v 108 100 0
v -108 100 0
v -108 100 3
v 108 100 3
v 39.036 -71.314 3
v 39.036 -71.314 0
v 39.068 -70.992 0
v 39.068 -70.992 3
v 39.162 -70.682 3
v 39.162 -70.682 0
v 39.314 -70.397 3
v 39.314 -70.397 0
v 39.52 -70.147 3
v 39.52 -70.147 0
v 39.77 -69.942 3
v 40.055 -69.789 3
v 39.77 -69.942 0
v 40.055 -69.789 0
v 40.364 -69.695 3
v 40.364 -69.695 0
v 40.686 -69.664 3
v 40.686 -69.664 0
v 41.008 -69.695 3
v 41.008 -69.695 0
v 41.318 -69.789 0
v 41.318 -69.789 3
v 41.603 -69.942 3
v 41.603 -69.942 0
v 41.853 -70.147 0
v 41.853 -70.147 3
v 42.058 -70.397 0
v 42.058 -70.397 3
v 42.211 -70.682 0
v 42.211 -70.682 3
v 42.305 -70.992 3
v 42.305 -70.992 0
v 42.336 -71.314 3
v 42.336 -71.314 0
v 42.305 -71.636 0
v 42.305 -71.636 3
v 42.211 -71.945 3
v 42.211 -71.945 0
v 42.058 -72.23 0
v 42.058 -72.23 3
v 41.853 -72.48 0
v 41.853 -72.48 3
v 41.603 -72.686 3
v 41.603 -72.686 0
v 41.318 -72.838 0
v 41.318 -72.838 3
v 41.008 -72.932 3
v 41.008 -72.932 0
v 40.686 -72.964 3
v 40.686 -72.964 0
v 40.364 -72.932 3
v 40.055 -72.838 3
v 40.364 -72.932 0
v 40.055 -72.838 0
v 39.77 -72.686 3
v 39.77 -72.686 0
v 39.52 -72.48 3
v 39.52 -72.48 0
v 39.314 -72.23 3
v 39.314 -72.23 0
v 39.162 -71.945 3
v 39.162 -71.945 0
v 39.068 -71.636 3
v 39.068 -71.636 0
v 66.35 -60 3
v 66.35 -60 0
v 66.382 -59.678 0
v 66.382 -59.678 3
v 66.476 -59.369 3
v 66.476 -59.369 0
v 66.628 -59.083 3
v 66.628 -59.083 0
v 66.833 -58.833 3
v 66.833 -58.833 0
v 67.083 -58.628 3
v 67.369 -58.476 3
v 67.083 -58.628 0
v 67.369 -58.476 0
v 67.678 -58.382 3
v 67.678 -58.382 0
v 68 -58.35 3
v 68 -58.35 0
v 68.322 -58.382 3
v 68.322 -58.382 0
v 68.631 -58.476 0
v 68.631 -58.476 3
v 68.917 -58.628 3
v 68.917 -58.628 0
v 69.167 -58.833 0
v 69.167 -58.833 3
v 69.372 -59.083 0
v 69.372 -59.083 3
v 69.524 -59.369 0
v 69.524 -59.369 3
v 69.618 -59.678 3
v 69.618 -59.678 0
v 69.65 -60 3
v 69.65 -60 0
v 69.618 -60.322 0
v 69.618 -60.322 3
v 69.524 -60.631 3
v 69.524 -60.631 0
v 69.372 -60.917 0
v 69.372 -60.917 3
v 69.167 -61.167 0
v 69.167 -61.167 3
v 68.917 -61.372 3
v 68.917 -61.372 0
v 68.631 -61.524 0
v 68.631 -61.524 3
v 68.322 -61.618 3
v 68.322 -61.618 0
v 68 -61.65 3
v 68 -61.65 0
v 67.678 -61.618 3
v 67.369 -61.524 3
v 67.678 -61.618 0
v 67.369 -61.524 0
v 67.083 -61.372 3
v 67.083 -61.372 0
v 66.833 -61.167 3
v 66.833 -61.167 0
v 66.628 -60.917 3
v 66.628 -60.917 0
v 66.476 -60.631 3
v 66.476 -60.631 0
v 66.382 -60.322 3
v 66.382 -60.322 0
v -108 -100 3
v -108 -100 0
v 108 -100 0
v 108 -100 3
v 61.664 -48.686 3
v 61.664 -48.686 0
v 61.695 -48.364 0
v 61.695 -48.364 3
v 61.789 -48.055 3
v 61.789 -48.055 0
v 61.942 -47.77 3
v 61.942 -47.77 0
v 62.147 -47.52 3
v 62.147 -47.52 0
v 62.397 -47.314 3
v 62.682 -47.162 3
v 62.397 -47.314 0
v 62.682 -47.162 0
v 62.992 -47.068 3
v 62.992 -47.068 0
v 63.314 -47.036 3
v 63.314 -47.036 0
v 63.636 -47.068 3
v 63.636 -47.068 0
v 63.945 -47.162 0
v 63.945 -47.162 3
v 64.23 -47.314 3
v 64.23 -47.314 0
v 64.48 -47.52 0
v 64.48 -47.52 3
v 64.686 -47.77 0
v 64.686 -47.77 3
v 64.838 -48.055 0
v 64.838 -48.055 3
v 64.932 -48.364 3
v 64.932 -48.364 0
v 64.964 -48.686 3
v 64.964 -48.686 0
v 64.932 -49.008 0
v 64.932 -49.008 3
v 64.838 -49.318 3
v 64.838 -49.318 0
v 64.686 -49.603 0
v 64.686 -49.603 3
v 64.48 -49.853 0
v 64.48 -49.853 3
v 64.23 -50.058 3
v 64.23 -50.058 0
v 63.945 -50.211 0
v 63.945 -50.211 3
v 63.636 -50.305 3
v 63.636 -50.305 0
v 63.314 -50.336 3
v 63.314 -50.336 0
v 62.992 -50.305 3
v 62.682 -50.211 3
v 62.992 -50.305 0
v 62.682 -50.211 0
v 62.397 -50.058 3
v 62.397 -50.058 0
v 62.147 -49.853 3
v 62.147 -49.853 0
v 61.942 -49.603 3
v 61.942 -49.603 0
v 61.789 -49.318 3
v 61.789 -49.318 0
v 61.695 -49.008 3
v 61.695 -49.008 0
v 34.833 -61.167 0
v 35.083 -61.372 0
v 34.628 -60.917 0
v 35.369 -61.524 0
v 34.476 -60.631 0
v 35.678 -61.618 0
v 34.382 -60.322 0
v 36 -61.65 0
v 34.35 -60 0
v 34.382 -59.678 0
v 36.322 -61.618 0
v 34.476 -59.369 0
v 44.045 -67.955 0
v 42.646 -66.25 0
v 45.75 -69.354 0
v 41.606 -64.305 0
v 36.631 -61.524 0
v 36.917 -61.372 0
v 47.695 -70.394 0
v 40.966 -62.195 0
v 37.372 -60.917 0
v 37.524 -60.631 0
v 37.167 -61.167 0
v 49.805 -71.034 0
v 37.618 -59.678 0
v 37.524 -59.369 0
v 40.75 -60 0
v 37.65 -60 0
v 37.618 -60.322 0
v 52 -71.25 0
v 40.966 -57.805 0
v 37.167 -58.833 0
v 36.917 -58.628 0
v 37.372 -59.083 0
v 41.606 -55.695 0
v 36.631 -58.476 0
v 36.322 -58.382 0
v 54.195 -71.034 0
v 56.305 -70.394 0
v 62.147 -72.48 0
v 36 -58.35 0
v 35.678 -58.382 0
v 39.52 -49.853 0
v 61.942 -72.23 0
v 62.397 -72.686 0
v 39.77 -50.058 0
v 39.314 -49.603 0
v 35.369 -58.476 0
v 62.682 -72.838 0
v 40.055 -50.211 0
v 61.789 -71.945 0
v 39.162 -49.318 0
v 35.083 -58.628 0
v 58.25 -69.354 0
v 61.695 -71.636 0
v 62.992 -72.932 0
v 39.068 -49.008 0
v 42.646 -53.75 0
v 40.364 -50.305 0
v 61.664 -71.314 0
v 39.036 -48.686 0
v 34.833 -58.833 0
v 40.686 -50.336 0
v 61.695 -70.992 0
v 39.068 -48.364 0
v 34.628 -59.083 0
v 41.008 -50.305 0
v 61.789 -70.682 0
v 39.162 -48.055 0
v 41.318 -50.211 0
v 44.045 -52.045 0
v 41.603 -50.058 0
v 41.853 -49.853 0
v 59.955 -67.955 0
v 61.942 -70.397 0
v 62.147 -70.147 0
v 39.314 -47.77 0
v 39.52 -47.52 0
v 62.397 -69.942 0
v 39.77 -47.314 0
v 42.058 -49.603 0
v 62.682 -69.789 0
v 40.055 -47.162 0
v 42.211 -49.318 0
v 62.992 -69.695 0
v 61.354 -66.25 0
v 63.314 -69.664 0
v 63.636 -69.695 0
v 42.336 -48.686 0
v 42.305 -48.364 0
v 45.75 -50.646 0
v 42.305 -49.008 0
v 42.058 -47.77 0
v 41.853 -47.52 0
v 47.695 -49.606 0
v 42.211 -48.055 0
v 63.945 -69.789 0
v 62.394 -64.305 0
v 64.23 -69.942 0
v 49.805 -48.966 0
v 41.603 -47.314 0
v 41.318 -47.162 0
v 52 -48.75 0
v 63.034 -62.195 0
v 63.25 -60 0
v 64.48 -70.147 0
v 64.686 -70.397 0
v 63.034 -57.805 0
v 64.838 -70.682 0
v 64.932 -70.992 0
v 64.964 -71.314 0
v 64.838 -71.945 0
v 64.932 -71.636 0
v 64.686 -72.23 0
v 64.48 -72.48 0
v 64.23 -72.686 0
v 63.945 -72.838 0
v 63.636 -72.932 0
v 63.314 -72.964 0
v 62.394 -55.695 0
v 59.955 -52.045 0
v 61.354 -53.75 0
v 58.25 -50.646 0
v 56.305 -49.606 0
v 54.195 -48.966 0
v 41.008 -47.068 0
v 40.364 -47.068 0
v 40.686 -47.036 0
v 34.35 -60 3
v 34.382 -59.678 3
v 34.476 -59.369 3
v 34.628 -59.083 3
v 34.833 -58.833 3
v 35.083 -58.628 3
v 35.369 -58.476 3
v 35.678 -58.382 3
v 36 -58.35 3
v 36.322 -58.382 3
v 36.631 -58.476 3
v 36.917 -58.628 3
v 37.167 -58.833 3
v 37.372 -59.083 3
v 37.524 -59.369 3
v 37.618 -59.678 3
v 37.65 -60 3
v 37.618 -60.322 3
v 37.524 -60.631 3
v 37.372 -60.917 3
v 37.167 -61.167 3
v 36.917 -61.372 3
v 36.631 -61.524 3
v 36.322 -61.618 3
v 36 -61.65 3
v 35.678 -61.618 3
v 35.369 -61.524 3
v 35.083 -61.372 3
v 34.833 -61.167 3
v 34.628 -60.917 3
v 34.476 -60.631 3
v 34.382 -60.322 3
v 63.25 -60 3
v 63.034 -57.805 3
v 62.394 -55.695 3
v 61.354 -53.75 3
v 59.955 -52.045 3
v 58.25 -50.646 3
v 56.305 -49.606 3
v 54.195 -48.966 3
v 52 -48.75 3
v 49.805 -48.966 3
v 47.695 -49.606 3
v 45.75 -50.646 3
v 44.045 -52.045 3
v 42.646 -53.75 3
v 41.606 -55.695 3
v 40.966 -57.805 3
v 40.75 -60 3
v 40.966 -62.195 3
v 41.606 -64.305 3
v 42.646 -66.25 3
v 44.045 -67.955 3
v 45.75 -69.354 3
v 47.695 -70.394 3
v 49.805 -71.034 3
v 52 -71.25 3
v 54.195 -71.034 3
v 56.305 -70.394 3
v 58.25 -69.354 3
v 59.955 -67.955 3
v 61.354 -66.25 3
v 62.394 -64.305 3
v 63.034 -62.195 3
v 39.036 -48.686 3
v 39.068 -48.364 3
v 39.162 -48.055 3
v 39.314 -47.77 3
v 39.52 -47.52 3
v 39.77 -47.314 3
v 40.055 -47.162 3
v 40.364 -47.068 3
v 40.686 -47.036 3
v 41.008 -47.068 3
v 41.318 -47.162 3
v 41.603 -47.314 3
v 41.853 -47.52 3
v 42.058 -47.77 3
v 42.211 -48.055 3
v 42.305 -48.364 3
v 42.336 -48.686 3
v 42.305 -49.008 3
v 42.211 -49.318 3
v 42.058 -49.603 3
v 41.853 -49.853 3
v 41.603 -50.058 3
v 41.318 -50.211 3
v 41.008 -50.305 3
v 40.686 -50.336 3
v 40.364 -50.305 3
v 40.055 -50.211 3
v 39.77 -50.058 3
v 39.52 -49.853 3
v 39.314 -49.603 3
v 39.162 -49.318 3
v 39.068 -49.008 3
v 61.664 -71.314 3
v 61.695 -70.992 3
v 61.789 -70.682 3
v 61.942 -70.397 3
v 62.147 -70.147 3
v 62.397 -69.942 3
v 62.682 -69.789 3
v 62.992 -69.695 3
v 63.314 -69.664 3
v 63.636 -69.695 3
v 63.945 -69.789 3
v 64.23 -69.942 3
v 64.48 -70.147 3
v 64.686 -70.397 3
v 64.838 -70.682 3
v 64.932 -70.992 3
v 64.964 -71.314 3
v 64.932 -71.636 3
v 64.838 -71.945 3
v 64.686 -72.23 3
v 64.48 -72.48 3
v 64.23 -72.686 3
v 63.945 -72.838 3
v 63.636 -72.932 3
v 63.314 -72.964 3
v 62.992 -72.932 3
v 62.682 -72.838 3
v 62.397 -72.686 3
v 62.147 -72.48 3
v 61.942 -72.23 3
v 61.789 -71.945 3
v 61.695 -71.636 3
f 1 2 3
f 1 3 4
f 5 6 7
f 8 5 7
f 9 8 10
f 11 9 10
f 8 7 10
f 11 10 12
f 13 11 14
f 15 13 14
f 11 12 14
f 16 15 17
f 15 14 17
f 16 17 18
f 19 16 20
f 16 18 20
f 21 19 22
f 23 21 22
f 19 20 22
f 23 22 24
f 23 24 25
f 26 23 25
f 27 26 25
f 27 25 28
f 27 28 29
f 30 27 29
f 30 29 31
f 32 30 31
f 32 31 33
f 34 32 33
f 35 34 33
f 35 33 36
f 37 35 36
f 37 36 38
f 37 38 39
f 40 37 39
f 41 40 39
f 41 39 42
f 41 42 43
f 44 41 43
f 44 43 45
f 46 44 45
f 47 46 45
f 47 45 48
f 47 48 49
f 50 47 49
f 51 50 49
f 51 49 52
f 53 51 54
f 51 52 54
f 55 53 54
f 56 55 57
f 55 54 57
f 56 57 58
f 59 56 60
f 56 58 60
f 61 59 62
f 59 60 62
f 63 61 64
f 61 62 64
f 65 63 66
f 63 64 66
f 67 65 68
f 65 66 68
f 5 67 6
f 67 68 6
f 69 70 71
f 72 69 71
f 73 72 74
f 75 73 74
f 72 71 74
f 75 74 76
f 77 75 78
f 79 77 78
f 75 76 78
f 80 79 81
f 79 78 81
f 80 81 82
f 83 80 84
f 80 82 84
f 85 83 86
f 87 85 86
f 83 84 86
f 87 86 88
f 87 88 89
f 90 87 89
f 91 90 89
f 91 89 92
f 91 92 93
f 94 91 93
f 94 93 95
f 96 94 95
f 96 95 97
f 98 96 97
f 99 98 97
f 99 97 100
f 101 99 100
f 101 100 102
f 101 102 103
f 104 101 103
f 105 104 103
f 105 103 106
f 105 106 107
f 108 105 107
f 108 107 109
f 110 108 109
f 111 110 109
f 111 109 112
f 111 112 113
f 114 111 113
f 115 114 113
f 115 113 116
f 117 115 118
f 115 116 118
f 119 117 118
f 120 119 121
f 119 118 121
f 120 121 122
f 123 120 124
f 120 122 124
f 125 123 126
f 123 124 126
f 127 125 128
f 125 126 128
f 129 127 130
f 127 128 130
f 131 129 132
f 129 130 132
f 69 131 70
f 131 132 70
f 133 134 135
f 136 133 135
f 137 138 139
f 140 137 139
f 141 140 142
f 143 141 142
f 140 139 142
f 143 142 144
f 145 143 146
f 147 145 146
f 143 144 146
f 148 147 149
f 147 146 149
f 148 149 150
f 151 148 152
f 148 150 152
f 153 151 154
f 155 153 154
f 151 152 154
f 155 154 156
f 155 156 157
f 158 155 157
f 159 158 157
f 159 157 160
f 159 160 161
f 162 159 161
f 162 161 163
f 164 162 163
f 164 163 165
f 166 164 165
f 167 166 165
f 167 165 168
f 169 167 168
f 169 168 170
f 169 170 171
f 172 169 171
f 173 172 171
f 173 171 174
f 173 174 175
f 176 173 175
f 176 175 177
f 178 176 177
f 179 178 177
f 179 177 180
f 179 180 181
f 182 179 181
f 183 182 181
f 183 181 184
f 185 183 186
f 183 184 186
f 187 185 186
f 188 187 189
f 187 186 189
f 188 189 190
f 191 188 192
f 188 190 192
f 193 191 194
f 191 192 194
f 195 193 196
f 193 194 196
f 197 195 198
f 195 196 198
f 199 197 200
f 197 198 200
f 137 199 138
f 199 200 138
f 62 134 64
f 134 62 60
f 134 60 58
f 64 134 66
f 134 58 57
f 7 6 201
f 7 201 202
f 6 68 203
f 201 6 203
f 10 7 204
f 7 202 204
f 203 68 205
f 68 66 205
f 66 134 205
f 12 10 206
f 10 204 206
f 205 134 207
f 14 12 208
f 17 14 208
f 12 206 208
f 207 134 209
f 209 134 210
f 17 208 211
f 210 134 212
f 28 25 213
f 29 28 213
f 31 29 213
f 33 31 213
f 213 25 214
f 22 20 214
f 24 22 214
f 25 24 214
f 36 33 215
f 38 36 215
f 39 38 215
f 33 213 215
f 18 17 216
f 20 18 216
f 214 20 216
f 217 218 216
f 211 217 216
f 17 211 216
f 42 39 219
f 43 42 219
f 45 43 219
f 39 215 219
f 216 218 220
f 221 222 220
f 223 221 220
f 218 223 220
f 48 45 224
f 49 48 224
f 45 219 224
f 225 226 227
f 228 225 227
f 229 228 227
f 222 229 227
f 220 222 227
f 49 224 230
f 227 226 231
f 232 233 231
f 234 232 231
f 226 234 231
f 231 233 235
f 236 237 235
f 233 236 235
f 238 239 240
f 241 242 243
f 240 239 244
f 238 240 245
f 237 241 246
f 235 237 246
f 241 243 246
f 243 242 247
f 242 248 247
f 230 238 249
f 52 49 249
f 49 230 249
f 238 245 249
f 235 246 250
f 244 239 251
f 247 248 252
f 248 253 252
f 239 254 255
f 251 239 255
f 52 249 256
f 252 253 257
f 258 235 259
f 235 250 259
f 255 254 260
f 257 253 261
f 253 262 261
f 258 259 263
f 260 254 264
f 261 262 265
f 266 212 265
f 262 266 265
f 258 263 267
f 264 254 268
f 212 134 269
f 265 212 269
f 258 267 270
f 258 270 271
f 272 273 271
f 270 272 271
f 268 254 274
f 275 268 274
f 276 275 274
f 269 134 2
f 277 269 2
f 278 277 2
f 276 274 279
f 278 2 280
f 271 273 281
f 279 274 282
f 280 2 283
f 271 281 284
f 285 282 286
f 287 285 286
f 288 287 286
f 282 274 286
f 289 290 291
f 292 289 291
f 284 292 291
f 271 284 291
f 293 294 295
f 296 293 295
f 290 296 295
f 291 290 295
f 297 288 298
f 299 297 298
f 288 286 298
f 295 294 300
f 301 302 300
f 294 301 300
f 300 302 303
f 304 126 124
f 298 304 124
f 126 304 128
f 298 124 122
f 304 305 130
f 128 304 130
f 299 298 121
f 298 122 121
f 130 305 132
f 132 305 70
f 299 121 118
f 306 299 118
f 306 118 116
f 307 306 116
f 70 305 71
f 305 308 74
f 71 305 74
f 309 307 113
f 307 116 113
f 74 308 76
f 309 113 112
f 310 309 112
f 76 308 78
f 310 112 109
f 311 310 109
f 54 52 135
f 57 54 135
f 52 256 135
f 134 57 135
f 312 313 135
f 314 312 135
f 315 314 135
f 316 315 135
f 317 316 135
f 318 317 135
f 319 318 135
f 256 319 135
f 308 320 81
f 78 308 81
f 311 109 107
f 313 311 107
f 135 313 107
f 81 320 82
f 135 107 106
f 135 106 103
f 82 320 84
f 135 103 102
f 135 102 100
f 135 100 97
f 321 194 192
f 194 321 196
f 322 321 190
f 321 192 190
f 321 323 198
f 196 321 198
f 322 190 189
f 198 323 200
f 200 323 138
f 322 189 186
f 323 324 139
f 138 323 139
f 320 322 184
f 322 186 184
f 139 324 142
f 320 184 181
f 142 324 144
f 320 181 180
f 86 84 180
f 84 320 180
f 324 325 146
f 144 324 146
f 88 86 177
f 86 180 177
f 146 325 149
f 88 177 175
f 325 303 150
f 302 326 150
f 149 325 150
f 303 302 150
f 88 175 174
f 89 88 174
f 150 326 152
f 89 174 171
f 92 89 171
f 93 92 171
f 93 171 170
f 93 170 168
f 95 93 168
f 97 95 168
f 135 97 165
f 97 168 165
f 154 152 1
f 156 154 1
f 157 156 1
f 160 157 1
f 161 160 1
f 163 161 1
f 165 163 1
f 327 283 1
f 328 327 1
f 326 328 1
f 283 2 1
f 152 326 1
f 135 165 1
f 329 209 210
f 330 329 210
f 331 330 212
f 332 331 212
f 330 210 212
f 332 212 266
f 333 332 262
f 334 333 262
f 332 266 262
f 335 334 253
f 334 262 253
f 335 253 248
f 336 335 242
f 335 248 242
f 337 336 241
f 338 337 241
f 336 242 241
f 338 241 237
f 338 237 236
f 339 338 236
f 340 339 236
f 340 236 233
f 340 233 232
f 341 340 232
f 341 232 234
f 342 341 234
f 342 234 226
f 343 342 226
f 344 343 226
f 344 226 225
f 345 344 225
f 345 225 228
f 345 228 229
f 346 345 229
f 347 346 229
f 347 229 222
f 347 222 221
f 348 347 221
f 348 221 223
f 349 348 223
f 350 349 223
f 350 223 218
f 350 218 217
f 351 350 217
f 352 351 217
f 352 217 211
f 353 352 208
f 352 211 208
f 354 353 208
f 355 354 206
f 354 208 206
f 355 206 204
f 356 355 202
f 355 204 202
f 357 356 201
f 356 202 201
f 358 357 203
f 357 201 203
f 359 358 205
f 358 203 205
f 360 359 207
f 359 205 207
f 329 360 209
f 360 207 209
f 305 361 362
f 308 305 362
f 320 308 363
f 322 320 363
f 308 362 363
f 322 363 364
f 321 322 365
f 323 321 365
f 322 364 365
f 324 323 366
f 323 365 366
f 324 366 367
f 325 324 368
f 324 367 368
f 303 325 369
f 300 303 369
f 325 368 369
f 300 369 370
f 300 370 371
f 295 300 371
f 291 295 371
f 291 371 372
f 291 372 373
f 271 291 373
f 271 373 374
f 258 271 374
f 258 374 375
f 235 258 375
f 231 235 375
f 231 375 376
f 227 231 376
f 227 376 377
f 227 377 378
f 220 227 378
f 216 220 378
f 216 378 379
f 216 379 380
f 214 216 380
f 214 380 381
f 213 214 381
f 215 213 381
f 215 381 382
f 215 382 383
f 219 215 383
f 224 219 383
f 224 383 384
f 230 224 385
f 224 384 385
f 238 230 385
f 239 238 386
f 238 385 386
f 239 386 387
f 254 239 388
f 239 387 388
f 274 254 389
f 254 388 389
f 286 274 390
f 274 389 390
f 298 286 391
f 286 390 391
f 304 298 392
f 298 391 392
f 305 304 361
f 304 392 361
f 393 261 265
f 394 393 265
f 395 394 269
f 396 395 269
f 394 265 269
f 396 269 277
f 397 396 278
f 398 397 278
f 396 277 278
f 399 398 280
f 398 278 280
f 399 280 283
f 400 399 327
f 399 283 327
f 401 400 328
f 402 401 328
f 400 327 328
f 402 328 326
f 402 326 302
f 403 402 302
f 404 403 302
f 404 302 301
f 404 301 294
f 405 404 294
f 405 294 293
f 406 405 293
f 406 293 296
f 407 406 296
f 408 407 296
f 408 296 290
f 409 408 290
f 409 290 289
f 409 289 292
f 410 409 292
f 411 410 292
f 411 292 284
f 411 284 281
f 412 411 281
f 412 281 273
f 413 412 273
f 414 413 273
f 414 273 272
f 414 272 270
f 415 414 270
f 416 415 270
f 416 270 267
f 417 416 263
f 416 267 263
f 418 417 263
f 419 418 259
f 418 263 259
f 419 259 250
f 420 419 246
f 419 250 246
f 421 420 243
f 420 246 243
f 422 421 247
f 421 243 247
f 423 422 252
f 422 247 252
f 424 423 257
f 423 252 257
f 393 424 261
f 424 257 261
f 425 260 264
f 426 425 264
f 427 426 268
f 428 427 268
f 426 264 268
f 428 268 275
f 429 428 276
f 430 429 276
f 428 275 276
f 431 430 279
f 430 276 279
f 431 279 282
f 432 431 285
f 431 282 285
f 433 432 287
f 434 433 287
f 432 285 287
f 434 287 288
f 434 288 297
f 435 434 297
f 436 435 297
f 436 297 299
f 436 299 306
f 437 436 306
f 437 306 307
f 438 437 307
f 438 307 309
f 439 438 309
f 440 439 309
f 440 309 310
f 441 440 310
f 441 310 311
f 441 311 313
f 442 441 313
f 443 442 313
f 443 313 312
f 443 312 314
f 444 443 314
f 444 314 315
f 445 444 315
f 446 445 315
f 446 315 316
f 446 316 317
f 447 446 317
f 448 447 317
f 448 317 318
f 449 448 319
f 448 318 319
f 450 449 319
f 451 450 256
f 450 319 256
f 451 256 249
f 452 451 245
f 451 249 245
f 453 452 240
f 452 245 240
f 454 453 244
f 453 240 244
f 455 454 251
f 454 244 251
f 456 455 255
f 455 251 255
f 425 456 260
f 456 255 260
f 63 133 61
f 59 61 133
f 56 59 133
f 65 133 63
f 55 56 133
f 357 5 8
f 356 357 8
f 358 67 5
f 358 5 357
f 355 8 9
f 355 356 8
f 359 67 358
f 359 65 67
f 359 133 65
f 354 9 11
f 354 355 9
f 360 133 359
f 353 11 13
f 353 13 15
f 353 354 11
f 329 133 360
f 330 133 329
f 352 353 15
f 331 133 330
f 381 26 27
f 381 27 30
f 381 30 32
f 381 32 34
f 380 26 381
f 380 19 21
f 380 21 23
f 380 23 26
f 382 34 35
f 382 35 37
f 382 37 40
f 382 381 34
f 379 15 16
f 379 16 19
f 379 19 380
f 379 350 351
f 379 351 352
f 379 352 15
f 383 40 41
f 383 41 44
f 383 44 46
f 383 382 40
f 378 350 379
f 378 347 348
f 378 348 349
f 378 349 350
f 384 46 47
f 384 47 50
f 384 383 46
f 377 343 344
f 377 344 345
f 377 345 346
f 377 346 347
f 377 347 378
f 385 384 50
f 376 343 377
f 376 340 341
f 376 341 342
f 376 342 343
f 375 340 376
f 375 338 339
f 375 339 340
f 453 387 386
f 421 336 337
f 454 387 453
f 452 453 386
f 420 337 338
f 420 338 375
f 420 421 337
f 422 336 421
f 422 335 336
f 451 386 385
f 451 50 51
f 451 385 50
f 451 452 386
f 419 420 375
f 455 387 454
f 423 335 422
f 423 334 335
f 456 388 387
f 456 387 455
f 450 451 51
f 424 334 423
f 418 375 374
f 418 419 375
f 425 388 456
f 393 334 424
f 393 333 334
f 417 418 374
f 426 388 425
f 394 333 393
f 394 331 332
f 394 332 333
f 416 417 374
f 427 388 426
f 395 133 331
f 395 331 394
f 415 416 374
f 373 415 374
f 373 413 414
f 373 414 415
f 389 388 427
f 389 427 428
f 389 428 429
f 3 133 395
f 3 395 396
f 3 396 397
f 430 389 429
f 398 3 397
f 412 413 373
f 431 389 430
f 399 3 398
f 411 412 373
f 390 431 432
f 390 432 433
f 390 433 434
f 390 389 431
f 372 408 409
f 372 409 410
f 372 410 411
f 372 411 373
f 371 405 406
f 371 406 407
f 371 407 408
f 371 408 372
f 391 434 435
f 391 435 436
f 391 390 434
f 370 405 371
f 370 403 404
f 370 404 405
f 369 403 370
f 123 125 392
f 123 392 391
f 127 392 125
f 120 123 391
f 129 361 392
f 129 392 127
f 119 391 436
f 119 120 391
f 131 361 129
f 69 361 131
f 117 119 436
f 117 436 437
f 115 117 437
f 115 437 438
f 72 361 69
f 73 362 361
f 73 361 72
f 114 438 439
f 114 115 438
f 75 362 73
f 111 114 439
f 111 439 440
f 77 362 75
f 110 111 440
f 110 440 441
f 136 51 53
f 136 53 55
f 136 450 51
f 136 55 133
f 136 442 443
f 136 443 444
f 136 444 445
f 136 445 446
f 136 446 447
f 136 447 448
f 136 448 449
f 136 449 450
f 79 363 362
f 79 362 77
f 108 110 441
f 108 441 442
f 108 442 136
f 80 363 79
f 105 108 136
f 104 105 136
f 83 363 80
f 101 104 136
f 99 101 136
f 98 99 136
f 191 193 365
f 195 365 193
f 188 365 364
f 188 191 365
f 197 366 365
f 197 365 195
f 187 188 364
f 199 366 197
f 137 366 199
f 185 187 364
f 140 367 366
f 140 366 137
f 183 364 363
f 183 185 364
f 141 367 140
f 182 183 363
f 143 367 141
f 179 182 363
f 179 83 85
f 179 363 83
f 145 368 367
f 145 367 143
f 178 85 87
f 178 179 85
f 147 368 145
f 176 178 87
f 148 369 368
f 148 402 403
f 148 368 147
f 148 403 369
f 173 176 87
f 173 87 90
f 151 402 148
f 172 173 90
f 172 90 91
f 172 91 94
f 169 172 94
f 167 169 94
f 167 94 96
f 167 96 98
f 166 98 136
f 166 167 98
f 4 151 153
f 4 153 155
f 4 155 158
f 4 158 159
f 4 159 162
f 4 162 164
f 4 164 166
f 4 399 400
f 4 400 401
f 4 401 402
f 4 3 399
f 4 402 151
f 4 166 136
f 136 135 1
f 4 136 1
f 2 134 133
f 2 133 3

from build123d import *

# Parameters (mm, degrees)
SKETCH_1_W          = 216
SKETCH_1_H          = 200
EXTRUDE_1_DEPTH     = 3
SKETCH_2_R          = 11.25
CUT_EXTRUDE_1_DEPTH = 148.217526131
HOLE_WIZARD_M4_1_D  = 3.3


with BuildPart() as part:
    # 草图1 → 凸台-拉伸1 (new body)
    with BuildSketch(Plane.XY):
        Rectangle(SKETCH_1_W, SKETCH_1_H)
    extrude(amount=EXTRUDE_1_DEPTH)

    # 草图2 → 切除-拉伸1 (cut, through all)
    with BuildSketch(Plane.XY.offset(3)):
        with Locations((52, -60)):
            Circle(SKETCH_2_R)
    extrude(amount=-CUT_EXTRUDE_1_DEPTH, mode=Mode.SUBTRACT)

    # M4 螺纹孔的螺纹孔钻头1 (through all)
    with Locations(Plane(origin=(36, -60, 3), x_dir=(1, 0, 0), z_dir=(0, 0, 1))):
        with Locations((0, 0), (4.686291501, 11.313708499), (4.686291501, -11.313708499), (27.313708499, 11.313708499), (32, 0), (27.313708499, -11.313708499)):
            Hole(HOLE_WIZARD_M4_1_D / 2)


solid = part.part
